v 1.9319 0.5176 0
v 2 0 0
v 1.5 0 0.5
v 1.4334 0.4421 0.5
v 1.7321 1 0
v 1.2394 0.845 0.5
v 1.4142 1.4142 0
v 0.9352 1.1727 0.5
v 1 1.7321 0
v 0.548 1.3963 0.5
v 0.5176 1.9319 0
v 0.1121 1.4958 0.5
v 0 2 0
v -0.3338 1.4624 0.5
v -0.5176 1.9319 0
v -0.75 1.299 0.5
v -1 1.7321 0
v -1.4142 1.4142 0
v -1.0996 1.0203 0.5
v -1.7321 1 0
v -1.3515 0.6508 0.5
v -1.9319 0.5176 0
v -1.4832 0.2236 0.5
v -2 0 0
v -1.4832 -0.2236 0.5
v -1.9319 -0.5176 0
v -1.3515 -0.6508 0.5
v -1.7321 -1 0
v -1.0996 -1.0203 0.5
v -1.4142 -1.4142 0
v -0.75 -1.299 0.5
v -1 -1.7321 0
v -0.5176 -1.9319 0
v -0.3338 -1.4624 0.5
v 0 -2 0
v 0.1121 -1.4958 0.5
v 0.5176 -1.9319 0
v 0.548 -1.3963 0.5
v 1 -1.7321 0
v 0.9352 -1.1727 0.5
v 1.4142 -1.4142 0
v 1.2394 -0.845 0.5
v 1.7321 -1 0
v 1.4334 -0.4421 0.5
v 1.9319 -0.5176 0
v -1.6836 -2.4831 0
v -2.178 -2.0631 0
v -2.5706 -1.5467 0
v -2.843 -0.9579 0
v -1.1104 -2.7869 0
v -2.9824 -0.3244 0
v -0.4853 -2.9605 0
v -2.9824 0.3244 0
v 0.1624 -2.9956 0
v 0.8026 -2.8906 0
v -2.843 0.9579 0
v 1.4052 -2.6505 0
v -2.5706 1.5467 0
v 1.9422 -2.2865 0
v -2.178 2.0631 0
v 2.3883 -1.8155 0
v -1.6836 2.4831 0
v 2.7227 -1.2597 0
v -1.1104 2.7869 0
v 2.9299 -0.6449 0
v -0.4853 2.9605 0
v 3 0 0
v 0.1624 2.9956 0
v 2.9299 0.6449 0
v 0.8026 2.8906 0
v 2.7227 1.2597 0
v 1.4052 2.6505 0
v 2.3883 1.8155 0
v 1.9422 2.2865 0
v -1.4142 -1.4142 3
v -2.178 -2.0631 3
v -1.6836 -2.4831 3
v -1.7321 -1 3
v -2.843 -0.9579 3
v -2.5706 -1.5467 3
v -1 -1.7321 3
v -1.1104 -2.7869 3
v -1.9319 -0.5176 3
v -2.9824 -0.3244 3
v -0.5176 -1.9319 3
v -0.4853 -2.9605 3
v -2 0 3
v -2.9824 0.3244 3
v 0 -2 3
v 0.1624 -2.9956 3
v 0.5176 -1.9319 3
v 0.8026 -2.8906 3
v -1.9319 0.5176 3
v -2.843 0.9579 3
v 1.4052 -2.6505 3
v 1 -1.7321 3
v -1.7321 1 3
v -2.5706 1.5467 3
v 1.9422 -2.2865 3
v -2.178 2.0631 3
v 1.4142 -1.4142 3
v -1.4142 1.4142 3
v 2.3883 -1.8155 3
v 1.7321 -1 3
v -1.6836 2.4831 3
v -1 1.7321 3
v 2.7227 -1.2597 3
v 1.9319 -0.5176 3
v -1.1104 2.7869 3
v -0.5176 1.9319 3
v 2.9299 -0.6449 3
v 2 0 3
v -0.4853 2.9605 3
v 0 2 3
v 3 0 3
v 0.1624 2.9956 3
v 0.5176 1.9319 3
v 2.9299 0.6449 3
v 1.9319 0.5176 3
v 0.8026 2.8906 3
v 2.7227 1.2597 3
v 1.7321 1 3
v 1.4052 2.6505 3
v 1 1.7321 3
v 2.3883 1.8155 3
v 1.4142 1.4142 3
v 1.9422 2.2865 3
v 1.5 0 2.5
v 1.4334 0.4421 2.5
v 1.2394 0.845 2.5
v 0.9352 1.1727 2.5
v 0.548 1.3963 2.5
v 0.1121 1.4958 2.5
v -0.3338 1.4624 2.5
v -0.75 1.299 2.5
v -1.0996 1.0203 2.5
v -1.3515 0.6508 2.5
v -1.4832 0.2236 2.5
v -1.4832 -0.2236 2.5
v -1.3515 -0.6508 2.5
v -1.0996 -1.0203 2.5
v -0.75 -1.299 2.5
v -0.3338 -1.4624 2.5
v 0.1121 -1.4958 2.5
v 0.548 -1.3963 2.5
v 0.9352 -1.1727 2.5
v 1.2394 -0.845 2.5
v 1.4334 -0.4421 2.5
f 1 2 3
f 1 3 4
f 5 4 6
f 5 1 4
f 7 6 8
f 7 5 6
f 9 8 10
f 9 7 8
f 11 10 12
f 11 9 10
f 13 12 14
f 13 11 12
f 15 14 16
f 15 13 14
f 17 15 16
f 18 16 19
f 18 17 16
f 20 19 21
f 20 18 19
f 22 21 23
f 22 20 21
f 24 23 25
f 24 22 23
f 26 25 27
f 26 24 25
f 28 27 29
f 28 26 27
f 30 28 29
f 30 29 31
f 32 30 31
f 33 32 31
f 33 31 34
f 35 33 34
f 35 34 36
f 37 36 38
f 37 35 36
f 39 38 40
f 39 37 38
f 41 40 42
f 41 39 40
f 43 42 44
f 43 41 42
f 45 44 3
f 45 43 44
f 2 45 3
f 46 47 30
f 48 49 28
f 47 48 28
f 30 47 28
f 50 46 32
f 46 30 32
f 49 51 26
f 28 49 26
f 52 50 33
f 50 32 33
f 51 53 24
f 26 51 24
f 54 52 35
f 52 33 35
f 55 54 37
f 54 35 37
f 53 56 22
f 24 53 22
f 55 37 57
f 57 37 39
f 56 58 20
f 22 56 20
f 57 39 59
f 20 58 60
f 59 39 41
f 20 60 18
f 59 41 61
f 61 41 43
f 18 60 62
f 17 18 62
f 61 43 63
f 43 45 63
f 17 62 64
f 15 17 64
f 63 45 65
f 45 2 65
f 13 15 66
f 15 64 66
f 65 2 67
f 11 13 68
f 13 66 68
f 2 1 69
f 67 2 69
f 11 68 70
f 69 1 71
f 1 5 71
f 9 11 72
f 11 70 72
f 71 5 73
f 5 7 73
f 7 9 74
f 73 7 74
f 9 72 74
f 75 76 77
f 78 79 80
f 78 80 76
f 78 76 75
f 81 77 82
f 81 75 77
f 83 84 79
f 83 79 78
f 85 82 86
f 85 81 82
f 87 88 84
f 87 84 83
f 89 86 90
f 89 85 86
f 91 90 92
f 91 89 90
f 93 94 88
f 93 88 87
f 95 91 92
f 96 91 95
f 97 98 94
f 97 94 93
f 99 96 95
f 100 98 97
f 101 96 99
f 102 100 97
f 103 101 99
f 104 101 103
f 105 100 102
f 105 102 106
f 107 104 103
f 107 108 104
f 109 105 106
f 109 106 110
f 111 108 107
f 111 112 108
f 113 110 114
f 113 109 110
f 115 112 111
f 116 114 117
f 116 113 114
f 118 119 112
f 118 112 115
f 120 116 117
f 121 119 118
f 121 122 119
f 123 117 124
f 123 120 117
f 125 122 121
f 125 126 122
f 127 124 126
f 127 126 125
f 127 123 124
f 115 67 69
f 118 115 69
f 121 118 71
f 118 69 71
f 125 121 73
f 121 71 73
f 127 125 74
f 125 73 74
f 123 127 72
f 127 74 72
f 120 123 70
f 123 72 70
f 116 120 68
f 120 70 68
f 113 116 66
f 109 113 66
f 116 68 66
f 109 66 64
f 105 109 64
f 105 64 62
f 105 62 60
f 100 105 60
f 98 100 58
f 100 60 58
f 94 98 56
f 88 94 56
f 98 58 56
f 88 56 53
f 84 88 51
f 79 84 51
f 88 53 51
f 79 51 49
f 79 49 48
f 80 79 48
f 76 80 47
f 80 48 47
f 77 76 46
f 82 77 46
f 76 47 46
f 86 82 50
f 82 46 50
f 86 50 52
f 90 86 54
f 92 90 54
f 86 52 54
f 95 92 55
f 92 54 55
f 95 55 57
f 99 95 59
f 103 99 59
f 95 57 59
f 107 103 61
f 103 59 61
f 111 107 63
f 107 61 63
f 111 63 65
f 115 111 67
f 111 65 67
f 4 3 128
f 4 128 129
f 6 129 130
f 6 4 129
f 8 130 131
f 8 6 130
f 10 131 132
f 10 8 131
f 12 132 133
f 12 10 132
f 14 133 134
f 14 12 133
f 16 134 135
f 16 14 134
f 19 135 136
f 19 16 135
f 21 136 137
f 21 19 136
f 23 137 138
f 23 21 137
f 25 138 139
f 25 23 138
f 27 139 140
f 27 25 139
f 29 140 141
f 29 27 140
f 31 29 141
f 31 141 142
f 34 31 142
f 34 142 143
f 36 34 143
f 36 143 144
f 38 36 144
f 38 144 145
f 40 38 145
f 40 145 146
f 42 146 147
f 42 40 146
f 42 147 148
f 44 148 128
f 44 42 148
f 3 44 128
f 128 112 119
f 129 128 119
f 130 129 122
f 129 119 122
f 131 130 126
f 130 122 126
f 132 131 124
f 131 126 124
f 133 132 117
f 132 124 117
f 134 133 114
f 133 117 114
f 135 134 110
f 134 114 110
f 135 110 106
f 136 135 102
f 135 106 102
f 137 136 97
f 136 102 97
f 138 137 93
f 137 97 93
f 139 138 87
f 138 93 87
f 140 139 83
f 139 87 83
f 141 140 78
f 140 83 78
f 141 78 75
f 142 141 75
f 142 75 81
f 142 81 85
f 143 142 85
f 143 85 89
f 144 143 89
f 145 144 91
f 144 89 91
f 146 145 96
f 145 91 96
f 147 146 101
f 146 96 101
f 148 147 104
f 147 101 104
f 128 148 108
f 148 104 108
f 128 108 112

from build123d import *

# Parameters (mm, degrees)
SCHIZZO1_R                   = 3
SCHIZZO1_R_2                 = 1.5
ESTRUSIONE_ESTRUSIONE1_DEPTH = 3
SMUSSO1_SIZE                 = 0.5
CHAMFER1_SIZE                = 0.5


with BuildPart() as part:
    # Schizzo1 → Estrusione-Estrusione1 (new body)
    with BuildSketch(Plane.XY):
        Circle(SCHIZZO1_R)
        Circle(SCHIZZO1_R_2, mode=Mode.SUBTRACT)
    extrude(amount=ESTRUSIONE_ESTRUSIONE1_DEPTH)

    # Smusso1
    smusso1_edges = [part.edges().sort_by_distance(p)[0] for p in [
        (-1.5, 0, 3),
    ]]
    chamfer(smusso1_edges, length=SMUSSO1_SIZE)

    # Chamfer1
    chamfer1_edges = [part.edges().sort_by_distance(p)[0] for p in [
        (-1.5, 0, 0),
    ]]
    chamfer(chamfer1_edges, length=CHAMFER1_SIZE)


solid = part.part
